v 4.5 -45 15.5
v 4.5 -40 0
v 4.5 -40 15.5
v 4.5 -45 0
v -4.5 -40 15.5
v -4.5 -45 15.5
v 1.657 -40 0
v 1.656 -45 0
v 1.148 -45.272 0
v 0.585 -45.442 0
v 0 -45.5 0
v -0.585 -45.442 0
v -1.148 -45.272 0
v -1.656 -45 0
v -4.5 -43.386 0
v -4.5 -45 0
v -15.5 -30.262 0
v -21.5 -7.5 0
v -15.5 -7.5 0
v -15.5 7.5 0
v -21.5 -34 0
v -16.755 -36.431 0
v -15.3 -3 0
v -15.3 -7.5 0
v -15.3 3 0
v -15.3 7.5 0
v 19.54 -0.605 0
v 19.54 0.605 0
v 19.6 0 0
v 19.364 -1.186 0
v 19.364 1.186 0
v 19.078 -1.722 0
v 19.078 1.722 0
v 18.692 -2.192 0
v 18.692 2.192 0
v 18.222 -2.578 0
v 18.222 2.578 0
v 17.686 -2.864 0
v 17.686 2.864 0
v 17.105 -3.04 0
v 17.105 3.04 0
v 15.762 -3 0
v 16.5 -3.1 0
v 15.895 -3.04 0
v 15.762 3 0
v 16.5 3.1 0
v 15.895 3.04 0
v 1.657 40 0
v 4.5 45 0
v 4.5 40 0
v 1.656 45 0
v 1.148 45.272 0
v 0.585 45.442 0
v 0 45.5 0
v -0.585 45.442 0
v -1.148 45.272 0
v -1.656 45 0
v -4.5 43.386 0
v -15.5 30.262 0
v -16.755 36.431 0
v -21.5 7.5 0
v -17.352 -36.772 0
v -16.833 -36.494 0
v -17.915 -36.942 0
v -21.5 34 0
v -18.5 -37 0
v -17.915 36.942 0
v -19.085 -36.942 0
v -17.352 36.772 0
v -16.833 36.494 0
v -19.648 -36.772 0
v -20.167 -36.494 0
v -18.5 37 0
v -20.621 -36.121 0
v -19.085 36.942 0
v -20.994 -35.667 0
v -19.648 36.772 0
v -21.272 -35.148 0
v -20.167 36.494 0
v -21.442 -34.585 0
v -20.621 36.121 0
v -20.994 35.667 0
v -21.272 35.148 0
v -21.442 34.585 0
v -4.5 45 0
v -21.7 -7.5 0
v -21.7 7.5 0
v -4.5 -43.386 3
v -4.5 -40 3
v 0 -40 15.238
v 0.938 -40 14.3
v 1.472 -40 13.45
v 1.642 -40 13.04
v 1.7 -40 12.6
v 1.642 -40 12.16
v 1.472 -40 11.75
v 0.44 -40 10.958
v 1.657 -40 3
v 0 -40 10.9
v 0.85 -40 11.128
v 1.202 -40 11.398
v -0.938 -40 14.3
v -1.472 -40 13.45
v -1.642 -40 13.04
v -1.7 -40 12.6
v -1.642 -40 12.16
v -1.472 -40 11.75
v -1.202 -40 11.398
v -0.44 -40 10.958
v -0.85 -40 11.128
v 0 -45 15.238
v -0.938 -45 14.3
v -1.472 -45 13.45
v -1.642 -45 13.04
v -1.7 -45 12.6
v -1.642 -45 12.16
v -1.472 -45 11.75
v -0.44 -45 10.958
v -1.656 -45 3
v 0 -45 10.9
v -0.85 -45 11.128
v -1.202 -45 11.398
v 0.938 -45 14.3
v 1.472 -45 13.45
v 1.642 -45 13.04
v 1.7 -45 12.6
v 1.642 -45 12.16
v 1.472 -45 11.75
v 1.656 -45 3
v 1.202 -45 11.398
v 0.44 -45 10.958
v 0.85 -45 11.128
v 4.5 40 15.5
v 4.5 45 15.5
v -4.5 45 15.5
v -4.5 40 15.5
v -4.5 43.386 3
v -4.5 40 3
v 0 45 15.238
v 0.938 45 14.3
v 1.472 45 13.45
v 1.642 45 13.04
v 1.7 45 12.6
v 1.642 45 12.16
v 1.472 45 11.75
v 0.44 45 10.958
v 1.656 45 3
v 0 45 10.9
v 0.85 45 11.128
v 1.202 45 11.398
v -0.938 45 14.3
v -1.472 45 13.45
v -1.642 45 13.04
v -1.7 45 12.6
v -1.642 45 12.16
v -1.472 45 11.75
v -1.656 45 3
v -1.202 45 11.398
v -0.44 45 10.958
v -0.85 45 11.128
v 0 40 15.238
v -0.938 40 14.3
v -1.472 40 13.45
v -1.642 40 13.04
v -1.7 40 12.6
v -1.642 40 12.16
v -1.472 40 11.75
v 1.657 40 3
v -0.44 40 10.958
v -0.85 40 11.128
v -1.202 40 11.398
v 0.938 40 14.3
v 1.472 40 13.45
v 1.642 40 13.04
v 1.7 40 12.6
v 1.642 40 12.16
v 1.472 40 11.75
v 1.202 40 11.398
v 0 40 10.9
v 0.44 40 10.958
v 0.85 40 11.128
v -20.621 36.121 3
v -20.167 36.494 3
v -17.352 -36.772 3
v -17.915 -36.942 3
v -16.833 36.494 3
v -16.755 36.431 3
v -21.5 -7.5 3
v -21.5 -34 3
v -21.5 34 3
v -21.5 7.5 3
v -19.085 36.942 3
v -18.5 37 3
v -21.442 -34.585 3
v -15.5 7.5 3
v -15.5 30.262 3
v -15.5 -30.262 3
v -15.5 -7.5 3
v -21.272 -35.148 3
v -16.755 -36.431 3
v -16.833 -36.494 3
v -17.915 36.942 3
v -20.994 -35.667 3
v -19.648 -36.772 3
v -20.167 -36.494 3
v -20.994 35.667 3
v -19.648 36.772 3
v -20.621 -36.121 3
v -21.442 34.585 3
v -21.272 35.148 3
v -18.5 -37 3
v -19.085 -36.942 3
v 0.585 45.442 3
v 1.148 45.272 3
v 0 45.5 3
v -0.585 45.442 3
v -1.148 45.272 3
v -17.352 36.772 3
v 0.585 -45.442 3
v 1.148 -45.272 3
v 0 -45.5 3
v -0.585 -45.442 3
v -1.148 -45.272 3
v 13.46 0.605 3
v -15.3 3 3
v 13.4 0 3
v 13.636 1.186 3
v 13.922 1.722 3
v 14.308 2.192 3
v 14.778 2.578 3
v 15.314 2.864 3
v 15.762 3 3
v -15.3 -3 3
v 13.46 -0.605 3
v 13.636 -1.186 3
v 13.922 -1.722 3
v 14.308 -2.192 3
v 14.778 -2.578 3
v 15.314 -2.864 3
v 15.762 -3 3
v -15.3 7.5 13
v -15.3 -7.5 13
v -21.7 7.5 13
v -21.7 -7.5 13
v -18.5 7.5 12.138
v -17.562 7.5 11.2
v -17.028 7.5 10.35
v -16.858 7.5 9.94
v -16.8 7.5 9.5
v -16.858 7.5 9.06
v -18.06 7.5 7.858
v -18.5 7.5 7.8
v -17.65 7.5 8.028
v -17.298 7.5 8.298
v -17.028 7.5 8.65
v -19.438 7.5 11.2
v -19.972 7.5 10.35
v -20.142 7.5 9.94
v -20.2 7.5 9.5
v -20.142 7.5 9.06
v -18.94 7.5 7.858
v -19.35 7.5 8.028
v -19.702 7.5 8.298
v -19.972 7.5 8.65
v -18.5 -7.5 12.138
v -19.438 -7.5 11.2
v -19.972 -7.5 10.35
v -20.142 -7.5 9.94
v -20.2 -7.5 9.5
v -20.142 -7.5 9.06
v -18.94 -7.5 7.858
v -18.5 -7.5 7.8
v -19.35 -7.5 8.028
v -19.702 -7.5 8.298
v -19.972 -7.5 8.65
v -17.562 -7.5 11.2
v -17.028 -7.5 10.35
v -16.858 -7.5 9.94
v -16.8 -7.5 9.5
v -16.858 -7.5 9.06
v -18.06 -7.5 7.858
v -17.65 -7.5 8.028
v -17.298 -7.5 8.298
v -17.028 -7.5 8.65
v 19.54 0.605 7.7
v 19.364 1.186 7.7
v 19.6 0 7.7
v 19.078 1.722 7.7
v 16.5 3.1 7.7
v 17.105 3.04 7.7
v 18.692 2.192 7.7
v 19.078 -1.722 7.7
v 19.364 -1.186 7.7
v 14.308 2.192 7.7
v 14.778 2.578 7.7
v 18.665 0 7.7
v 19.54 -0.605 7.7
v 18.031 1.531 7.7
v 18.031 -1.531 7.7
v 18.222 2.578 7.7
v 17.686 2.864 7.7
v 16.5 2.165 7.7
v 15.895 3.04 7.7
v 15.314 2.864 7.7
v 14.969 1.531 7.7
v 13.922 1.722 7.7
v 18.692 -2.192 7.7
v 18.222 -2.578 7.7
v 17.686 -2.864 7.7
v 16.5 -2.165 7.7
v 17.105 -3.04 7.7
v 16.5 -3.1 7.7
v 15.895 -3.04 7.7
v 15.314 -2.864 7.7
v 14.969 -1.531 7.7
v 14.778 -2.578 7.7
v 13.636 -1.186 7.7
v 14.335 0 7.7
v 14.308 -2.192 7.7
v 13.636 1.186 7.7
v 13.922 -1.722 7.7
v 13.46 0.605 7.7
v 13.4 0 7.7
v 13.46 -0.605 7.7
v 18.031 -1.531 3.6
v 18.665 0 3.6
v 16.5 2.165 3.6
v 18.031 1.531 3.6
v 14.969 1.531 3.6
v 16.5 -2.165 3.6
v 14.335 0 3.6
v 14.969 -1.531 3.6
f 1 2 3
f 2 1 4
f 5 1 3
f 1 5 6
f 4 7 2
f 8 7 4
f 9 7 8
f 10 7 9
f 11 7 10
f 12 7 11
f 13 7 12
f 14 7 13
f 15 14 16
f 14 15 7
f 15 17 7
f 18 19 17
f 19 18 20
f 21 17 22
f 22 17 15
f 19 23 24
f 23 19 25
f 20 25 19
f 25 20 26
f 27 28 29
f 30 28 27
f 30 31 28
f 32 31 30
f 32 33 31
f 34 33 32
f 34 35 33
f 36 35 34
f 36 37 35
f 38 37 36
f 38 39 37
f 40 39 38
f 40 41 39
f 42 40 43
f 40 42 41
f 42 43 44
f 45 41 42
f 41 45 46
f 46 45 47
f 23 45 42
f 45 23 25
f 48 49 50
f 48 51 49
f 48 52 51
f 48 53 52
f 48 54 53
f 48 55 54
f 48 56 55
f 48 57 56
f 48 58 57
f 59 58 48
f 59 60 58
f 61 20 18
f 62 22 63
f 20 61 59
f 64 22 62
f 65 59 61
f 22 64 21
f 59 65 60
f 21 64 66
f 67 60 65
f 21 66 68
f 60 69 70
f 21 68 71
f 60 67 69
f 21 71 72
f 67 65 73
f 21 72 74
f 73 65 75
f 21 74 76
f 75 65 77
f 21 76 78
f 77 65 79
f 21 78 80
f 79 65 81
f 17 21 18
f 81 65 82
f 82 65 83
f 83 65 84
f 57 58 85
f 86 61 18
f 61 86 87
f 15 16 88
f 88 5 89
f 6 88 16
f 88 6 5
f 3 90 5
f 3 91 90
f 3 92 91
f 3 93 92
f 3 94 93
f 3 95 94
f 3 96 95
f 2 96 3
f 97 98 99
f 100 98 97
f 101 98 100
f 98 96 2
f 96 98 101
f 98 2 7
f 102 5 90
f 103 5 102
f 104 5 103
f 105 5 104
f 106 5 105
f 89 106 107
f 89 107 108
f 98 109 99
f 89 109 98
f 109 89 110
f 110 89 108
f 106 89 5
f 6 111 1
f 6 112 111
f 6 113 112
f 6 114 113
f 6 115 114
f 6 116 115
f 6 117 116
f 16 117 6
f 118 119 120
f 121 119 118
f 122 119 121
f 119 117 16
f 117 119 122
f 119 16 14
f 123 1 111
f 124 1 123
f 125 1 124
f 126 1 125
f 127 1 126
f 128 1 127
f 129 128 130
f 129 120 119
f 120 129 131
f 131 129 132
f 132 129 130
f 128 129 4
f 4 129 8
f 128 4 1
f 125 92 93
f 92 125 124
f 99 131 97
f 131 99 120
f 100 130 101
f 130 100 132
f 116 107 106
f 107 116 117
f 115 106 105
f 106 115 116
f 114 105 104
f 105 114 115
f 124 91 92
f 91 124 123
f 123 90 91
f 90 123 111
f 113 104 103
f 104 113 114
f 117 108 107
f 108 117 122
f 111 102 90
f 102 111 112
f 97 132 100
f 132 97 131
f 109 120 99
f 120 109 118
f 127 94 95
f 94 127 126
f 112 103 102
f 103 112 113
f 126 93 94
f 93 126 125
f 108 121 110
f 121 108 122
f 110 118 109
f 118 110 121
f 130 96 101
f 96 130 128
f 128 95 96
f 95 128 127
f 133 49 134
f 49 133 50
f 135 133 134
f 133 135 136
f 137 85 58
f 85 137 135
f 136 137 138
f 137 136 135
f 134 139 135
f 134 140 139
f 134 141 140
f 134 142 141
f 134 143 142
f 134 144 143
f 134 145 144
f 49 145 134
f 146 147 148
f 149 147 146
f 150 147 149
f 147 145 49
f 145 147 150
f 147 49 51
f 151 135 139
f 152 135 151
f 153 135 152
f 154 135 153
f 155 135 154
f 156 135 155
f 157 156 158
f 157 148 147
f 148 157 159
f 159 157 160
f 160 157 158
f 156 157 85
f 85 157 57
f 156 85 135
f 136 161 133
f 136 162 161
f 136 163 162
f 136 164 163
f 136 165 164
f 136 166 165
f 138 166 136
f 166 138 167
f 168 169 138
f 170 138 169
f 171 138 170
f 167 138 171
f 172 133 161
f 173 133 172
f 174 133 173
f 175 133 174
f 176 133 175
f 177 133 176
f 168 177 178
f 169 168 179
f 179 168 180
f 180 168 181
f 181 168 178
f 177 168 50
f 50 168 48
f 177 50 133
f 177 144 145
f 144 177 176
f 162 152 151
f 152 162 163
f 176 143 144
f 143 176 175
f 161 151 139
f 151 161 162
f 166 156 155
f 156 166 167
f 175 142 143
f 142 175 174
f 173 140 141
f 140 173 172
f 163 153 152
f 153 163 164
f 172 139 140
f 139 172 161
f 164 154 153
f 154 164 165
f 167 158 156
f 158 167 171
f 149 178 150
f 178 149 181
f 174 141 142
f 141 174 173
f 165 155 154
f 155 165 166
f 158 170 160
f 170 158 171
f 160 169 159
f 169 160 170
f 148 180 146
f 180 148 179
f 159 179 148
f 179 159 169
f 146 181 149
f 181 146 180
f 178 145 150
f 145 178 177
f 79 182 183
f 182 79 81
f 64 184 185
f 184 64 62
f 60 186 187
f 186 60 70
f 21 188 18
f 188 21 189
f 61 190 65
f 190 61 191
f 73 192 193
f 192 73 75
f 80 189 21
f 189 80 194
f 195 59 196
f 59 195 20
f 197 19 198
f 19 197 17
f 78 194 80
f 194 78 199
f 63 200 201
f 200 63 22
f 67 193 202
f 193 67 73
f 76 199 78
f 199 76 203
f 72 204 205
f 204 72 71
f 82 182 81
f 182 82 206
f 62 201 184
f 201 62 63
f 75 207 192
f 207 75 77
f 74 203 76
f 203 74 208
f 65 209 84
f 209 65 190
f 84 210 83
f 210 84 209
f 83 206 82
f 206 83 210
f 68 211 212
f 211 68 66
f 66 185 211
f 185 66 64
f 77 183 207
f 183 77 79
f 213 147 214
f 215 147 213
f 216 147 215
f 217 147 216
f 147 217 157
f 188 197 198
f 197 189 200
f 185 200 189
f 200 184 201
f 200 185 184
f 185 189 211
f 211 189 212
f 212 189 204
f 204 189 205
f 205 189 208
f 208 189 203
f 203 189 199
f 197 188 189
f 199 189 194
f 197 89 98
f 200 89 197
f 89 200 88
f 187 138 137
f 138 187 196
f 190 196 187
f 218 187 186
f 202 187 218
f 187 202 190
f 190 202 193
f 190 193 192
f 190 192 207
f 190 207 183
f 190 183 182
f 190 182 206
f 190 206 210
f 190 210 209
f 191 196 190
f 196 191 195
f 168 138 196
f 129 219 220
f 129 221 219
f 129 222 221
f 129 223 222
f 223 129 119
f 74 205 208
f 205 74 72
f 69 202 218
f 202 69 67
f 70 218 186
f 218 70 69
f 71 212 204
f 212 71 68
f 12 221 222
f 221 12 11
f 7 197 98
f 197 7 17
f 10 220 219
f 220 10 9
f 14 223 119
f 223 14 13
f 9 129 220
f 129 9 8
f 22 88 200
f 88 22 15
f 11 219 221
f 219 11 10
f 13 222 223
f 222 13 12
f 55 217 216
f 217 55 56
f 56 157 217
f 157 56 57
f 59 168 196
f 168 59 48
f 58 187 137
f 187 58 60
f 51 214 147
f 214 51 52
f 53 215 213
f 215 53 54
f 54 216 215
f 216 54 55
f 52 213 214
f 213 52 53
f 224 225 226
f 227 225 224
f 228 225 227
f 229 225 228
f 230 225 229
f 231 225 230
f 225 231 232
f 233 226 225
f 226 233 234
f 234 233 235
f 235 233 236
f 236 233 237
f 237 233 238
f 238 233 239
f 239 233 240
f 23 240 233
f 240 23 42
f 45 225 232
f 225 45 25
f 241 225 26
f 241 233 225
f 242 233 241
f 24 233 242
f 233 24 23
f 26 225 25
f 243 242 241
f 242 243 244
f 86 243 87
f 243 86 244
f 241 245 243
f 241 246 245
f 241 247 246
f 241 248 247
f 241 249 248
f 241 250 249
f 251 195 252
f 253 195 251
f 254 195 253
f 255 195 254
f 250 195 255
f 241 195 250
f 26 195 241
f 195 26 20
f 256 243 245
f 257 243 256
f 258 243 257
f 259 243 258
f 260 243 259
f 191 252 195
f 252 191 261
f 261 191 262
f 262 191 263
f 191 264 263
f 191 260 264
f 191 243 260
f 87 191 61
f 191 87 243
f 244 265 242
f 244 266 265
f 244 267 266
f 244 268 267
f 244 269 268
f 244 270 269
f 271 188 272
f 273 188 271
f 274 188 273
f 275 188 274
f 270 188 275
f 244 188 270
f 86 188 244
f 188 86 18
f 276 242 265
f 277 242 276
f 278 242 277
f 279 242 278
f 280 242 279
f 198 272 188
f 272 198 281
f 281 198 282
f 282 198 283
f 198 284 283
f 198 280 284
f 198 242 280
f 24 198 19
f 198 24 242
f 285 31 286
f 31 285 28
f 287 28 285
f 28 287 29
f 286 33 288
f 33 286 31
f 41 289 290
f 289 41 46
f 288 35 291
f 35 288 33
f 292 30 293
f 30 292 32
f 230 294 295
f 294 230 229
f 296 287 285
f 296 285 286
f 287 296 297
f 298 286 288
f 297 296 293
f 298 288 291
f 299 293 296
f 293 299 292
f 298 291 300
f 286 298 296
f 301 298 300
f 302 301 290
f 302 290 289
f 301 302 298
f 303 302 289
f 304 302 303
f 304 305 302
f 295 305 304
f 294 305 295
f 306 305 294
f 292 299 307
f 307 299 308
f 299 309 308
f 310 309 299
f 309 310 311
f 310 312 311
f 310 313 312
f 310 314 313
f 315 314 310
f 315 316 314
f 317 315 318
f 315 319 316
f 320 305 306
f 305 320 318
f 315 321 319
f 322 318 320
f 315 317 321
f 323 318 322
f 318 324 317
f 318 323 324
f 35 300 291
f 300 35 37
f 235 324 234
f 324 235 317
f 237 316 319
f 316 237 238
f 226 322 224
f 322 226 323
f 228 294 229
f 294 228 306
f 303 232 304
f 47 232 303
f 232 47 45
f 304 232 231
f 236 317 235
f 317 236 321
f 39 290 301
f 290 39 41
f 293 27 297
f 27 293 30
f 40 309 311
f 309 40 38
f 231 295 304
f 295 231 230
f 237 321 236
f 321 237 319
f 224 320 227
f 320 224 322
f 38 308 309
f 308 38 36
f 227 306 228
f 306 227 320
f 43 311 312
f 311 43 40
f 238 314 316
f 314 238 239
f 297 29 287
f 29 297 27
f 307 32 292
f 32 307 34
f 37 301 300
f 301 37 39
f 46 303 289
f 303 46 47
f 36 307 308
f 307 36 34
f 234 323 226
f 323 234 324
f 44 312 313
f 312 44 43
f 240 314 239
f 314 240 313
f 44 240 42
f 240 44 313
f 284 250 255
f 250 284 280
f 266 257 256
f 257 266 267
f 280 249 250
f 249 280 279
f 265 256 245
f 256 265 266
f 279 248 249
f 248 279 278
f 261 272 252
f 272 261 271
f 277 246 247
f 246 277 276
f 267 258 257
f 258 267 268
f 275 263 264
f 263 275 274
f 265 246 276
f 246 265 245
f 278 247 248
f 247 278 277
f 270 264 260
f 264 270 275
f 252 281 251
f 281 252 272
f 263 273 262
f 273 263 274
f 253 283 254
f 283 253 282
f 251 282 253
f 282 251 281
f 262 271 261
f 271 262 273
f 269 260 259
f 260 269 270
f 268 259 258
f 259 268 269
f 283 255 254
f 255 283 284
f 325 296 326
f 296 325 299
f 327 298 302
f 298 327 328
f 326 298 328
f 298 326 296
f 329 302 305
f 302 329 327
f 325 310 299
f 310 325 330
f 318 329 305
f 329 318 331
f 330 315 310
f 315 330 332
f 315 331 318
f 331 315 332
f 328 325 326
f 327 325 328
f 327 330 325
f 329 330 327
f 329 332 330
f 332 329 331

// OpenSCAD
// =====================================================================
// child_lcd_hinge_frame.scad — fixed C-frame behind the hinged LCD door
//
// Print flat as modelled. In the assembly rotate([-90,0,0]); the base remains
// behind the LCD, while vertical lugs reach the existing support arches and
// hinge axis. The open C-frame leaves C-MAIN accessible when the door swings.
// =====================================================================

include <../../../../../scad/lib/util.scad>;

/* [Existing support interface] */
mount_pitch = 95.0;
mount_y = mount_pitch/2;
support_world_y = 39.6;
assembly_origin_y = 27.0;
mount_axis_z = support_world_y-assembly_origin_y; // 12.6 in print coordinates
mount_clear_d = 3.4;
mount_lug_w = 9.0;
mount_lug_len = 5.0;
mount_lug_h = 15.5;
arch_t = 5.0;                  // child_lcd_support rib_t: the arches occupy |y| = mount_y ± arch_t/2
// 2026-08-28: lugs used to sit IN the arch band (penetration 2.6 mm). They now
// sit on the arch inner faces and the M3x10 screw runs axially into the arch pilot.
lug_y1 = mount_y - arch_t/2;    // outer face of each lug = arch inner face (|y| = 45)
lug_yc = lug_y1 - mount_lug_len/2;
assert(lug_y1 <= mount_y - arch_t/2 + 0.01, "mount lug overlaps the support arch");

/* [Frame] */
base_t = 3.0;
beam_w = 6.0;
hinge_x = -18.5;
hinge_axis_z = 9.5;
hinge_pin_d = 3.4;
hinge_y0 = -7.5;
hinge_y1 = 7.5;
hinge_block_w = 6.4;
hinge_block_h = 13.0;

/* [Latch — M2.5 heat-set insert] */
latch_x = 16.5;
latch_boss_d = 6.2;
latch_top_z = 7.7;             // reaches door rear face at assembly Y=34.7
insert_d = 4.0;
insert_depth = 4.0;

$fa = 4;
$fs = 0.3;

assert(abs((assembly_origin_y+hinge_axis_z)-36.5)<0.01,
       "Frame hinge axis must match LCD door world Y=36.5");
assert(latch_x-latch_boss_d/2 > 13.1,
       "Latch boss overlaps the LCD module envelope");

module pad(p,d,h=base_t) {
    translate([p[0],p[1],0]) cylinder(d=d,h=h,$fn=32);
}

module beam(a,b,d=beam_w,h=base_t) {
    hull() { pad(a,d,h); pad(b,d,h); }
}

module mount_lug(sy) {
    difference() {
        translate([-mount_lug_w/2,
                   sy>0 ? lug_y1-mount_lug_len : -lug_y1,
                   0])
            cube([mount_lug_w,mount_lug_len,mount_lug_h]);
        // bore starts at the lug inner face and runs outward through the whole lug
        translate([0,sy*(lug_y1-mount_lug_len-0.1),mount_axis_z])
            rotate([0,0,sy>0 ? 90 : -90])
                teardrop_bore(mount_clear_d,mount_lug_len+0.2);
    }
}

difference() {
    union() {
        // Left spine and three arms form an open C/E frame behind the display.
        beam([hinge_x,-34],[hinge_x,34]);
        beam([hinge_x,-32],[0,-lug_yc]);
        beam([hinge_x, 32],[0, lug_yc]);
        beam([hinge_x,0],[latch_x,0]);

        for (sy=[-1,1]) mount_lug(sy);

        // Central stationary hinge knuckle interleaves with the two door leaves.
        translate([hinge_x-hinge_block_w/2,hinge_y0,0])
            cube([hinge_block_w,hinge_y1-hinge_y0,hinge_block_h]);

        // Latch boss accepts a reusable M2.5 heat-set insert from the top.
        translate([latch_x,0,0]) cylinder(d=latch_boss_d,h=latch_top_z,$fn=32);
    }

    translate([hinge_x,hinge_y0-0.1,hinge_axis_z])
        rotate([0,0,90]) teardrop_bore(hinge_pin_d,hinge_y1-hinge_y0+0.2);

    translate([latch_x,0,latch_top_z-insert_depth])
        hole(insert_d,insert_depth+0.2,fn=8);
}

echo(str("child_lcd_hinge_frame: mount pitch=",mount_pitch,
         " hinge=",hinge_x," latch=",latch_x));
